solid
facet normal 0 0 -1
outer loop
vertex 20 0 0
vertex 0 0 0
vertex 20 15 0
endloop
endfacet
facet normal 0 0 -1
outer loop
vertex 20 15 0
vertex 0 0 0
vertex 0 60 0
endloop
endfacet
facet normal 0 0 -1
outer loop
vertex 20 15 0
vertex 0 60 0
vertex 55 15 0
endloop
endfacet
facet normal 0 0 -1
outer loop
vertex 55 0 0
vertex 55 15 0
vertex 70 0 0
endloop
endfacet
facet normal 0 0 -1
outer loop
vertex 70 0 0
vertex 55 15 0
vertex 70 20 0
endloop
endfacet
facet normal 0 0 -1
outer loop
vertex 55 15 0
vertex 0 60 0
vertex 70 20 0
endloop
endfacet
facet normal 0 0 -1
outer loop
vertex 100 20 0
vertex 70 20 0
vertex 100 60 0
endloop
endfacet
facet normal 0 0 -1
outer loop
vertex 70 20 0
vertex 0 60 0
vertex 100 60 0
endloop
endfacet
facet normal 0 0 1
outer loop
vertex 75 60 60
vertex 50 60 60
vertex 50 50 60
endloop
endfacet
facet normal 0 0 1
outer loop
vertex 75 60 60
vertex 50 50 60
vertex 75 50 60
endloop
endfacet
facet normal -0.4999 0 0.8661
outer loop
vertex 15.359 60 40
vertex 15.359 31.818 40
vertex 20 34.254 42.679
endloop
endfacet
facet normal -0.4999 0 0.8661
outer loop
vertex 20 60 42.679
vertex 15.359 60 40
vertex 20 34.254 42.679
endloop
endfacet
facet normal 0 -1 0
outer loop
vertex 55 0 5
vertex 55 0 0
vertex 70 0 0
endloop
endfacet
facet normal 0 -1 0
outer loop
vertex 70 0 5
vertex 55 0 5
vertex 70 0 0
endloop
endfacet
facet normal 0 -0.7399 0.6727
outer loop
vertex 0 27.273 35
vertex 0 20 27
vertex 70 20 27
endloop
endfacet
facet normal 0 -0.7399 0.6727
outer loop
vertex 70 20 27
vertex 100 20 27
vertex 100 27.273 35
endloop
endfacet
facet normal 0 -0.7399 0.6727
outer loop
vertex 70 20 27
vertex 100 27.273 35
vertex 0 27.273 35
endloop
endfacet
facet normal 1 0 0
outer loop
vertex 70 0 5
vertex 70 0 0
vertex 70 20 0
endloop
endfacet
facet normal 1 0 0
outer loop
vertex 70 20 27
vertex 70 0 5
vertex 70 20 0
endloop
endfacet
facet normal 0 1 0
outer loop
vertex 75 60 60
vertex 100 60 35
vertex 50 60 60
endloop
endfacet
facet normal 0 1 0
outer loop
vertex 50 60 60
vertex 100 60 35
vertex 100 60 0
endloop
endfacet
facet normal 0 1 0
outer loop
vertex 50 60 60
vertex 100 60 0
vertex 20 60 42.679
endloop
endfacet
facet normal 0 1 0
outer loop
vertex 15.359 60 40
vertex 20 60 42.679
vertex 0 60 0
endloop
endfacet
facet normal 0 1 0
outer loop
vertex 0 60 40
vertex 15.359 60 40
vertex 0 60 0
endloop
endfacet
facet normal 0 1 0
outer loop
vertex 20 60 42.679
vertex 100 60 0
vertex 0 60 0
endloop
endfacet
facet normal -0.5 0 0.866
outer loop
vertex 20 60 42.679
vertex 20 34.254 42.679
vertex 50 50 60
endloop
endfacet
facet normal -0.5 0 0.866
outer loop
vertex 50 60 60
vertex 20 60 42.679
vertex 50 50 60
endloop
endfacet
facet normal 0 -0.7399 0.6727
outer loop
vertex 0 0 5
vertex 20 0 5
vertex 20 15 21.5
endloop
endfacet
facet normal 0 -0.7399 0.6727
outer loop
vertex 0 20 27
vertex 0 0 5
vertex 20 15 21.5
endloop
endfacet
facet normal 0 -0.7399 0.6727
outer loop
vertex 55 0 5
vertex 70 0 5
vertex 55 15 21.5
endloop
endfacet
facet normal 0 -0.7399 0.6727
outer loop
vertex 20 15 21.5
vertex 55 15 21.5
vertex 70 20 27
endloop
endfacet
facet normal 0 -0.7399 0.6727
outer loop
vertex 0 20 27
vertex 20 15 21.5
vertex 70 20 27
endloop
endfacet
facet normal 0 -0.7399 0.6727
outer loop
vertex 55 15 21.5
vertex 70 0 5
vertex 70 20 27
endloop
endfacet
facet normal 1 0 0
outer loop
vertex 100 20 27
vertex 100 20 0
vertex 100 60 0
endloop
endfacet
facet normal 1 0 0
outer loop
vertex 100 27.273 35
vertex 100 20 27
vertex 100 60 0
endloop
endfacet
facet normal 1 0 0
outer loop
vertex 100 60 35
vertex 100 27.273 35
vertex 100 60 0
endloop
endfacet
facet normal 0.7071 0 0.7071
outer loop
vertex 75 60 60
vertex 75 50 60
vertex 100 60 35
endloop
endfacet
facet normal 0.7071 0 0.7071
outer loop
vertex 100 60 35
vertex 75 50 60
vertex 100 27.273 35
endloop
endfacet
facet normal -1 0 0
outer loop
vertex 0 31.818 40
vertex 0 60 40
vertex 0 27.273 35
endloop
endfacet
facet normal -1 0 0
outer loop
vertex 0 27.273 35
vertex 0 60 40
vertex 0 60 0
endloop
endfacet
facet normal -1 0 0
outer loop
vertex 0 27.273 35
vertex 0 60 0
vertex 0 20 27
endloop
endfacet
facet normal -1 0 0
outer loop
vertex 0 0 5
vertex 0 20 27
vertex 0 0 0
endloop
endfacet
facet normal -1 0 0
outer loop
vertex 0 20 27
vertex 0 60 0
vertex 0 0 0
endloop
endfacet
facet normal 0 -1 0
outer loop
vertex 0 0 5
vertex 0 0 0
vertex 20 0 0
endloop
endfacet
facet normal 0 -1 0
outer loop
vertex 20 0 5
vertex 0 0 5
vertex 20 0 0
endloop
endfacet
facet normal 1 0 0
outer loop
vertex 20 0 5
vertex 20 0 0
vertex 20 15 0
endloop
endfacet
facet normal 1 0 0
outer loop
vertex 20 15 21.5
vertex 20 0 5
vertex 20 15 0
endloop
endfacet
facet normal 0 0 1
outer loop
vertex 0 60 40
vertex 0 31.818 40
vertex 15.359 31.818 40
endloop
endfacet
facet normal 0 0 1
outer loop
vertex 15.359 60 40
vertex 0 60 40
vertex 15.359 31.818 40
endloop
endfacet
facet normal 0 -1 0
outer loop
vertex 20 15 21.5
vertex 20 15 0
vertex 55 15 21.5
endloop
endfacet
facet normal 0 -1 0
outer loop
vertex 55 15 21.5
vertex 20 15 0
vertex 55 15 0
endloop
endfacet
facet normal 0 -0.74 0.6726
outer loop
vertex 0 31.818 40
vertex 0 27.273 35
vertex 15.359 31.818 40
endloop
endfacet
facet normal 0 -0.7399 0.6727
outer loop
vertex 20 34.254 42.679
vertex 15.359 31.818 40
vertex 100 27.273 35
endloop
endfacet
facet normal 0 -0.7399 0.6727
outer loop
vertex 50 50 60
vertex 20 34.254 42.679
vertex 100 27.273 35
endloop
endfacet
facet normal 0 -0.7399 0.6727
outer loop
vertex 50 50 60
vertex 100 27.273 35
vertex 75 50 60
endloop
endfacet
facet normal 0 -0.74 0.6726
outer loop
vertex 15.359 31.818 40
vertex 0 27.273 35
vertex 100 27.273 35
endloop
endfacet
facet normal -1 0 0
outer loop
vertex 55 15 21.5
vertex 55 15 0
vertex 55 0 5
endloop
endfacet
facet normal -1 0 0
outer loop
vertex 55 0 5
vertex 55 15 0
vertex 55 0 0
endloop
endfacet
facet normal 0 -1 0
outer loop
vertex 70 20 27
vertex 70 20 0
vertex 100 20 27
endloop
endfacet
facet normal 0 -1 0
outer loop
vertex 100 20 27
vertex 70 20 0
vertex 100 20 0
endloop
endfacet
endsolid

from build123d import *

# Parameters (mm, degrees)
F1_DEPTH = 60
F3_DEPTH = 60.001
F5_DEPTH = 100.001


with BuildPart() as f1:
    # F0 (on Top) → F1 (new body)
    with BuildSketch(Plane.XY):
        Polygon((0, 60), (0, 0), (20, 0), (20, 15), (55, 15), (55, 0), (70, 0), (70, 20), (100, 20), (100, 60), align=None)
    extrude(amount=F1_DEPTH)

    # F2 (on face) → F3 (cut, through all)
    with BuildSketch(Plane.XZ):
        Polygon((0, 60), (0, 40), (15.3589838486, 40), (20, 42.6794919243), (20, 60), align=None)
        Polygon((20, 60), (20, 42.6794919243), (50, 60), align=None)
        Polygon((100, 60), (75, 60), (100, 35), align=None)
    extrude(amount=-F3_DEPTH, mode=Mode.SUBTRACT)

    # F4 (on face) → F5 (cut, through all)
    with BuildSketch(Plane.YZ.offset(100)):
        Polygon((27.2727272727, 35), (50, 60), (0, 60), (0, 5), (20, 27), (20, 35), align=None)
        Polygon((20, 27), (27.2727272727, 35), (20, 35), align=None)
    extrude(amount=-F5_DEPTH, mode=Mode.SUBTRACT)


solid = f1.part
